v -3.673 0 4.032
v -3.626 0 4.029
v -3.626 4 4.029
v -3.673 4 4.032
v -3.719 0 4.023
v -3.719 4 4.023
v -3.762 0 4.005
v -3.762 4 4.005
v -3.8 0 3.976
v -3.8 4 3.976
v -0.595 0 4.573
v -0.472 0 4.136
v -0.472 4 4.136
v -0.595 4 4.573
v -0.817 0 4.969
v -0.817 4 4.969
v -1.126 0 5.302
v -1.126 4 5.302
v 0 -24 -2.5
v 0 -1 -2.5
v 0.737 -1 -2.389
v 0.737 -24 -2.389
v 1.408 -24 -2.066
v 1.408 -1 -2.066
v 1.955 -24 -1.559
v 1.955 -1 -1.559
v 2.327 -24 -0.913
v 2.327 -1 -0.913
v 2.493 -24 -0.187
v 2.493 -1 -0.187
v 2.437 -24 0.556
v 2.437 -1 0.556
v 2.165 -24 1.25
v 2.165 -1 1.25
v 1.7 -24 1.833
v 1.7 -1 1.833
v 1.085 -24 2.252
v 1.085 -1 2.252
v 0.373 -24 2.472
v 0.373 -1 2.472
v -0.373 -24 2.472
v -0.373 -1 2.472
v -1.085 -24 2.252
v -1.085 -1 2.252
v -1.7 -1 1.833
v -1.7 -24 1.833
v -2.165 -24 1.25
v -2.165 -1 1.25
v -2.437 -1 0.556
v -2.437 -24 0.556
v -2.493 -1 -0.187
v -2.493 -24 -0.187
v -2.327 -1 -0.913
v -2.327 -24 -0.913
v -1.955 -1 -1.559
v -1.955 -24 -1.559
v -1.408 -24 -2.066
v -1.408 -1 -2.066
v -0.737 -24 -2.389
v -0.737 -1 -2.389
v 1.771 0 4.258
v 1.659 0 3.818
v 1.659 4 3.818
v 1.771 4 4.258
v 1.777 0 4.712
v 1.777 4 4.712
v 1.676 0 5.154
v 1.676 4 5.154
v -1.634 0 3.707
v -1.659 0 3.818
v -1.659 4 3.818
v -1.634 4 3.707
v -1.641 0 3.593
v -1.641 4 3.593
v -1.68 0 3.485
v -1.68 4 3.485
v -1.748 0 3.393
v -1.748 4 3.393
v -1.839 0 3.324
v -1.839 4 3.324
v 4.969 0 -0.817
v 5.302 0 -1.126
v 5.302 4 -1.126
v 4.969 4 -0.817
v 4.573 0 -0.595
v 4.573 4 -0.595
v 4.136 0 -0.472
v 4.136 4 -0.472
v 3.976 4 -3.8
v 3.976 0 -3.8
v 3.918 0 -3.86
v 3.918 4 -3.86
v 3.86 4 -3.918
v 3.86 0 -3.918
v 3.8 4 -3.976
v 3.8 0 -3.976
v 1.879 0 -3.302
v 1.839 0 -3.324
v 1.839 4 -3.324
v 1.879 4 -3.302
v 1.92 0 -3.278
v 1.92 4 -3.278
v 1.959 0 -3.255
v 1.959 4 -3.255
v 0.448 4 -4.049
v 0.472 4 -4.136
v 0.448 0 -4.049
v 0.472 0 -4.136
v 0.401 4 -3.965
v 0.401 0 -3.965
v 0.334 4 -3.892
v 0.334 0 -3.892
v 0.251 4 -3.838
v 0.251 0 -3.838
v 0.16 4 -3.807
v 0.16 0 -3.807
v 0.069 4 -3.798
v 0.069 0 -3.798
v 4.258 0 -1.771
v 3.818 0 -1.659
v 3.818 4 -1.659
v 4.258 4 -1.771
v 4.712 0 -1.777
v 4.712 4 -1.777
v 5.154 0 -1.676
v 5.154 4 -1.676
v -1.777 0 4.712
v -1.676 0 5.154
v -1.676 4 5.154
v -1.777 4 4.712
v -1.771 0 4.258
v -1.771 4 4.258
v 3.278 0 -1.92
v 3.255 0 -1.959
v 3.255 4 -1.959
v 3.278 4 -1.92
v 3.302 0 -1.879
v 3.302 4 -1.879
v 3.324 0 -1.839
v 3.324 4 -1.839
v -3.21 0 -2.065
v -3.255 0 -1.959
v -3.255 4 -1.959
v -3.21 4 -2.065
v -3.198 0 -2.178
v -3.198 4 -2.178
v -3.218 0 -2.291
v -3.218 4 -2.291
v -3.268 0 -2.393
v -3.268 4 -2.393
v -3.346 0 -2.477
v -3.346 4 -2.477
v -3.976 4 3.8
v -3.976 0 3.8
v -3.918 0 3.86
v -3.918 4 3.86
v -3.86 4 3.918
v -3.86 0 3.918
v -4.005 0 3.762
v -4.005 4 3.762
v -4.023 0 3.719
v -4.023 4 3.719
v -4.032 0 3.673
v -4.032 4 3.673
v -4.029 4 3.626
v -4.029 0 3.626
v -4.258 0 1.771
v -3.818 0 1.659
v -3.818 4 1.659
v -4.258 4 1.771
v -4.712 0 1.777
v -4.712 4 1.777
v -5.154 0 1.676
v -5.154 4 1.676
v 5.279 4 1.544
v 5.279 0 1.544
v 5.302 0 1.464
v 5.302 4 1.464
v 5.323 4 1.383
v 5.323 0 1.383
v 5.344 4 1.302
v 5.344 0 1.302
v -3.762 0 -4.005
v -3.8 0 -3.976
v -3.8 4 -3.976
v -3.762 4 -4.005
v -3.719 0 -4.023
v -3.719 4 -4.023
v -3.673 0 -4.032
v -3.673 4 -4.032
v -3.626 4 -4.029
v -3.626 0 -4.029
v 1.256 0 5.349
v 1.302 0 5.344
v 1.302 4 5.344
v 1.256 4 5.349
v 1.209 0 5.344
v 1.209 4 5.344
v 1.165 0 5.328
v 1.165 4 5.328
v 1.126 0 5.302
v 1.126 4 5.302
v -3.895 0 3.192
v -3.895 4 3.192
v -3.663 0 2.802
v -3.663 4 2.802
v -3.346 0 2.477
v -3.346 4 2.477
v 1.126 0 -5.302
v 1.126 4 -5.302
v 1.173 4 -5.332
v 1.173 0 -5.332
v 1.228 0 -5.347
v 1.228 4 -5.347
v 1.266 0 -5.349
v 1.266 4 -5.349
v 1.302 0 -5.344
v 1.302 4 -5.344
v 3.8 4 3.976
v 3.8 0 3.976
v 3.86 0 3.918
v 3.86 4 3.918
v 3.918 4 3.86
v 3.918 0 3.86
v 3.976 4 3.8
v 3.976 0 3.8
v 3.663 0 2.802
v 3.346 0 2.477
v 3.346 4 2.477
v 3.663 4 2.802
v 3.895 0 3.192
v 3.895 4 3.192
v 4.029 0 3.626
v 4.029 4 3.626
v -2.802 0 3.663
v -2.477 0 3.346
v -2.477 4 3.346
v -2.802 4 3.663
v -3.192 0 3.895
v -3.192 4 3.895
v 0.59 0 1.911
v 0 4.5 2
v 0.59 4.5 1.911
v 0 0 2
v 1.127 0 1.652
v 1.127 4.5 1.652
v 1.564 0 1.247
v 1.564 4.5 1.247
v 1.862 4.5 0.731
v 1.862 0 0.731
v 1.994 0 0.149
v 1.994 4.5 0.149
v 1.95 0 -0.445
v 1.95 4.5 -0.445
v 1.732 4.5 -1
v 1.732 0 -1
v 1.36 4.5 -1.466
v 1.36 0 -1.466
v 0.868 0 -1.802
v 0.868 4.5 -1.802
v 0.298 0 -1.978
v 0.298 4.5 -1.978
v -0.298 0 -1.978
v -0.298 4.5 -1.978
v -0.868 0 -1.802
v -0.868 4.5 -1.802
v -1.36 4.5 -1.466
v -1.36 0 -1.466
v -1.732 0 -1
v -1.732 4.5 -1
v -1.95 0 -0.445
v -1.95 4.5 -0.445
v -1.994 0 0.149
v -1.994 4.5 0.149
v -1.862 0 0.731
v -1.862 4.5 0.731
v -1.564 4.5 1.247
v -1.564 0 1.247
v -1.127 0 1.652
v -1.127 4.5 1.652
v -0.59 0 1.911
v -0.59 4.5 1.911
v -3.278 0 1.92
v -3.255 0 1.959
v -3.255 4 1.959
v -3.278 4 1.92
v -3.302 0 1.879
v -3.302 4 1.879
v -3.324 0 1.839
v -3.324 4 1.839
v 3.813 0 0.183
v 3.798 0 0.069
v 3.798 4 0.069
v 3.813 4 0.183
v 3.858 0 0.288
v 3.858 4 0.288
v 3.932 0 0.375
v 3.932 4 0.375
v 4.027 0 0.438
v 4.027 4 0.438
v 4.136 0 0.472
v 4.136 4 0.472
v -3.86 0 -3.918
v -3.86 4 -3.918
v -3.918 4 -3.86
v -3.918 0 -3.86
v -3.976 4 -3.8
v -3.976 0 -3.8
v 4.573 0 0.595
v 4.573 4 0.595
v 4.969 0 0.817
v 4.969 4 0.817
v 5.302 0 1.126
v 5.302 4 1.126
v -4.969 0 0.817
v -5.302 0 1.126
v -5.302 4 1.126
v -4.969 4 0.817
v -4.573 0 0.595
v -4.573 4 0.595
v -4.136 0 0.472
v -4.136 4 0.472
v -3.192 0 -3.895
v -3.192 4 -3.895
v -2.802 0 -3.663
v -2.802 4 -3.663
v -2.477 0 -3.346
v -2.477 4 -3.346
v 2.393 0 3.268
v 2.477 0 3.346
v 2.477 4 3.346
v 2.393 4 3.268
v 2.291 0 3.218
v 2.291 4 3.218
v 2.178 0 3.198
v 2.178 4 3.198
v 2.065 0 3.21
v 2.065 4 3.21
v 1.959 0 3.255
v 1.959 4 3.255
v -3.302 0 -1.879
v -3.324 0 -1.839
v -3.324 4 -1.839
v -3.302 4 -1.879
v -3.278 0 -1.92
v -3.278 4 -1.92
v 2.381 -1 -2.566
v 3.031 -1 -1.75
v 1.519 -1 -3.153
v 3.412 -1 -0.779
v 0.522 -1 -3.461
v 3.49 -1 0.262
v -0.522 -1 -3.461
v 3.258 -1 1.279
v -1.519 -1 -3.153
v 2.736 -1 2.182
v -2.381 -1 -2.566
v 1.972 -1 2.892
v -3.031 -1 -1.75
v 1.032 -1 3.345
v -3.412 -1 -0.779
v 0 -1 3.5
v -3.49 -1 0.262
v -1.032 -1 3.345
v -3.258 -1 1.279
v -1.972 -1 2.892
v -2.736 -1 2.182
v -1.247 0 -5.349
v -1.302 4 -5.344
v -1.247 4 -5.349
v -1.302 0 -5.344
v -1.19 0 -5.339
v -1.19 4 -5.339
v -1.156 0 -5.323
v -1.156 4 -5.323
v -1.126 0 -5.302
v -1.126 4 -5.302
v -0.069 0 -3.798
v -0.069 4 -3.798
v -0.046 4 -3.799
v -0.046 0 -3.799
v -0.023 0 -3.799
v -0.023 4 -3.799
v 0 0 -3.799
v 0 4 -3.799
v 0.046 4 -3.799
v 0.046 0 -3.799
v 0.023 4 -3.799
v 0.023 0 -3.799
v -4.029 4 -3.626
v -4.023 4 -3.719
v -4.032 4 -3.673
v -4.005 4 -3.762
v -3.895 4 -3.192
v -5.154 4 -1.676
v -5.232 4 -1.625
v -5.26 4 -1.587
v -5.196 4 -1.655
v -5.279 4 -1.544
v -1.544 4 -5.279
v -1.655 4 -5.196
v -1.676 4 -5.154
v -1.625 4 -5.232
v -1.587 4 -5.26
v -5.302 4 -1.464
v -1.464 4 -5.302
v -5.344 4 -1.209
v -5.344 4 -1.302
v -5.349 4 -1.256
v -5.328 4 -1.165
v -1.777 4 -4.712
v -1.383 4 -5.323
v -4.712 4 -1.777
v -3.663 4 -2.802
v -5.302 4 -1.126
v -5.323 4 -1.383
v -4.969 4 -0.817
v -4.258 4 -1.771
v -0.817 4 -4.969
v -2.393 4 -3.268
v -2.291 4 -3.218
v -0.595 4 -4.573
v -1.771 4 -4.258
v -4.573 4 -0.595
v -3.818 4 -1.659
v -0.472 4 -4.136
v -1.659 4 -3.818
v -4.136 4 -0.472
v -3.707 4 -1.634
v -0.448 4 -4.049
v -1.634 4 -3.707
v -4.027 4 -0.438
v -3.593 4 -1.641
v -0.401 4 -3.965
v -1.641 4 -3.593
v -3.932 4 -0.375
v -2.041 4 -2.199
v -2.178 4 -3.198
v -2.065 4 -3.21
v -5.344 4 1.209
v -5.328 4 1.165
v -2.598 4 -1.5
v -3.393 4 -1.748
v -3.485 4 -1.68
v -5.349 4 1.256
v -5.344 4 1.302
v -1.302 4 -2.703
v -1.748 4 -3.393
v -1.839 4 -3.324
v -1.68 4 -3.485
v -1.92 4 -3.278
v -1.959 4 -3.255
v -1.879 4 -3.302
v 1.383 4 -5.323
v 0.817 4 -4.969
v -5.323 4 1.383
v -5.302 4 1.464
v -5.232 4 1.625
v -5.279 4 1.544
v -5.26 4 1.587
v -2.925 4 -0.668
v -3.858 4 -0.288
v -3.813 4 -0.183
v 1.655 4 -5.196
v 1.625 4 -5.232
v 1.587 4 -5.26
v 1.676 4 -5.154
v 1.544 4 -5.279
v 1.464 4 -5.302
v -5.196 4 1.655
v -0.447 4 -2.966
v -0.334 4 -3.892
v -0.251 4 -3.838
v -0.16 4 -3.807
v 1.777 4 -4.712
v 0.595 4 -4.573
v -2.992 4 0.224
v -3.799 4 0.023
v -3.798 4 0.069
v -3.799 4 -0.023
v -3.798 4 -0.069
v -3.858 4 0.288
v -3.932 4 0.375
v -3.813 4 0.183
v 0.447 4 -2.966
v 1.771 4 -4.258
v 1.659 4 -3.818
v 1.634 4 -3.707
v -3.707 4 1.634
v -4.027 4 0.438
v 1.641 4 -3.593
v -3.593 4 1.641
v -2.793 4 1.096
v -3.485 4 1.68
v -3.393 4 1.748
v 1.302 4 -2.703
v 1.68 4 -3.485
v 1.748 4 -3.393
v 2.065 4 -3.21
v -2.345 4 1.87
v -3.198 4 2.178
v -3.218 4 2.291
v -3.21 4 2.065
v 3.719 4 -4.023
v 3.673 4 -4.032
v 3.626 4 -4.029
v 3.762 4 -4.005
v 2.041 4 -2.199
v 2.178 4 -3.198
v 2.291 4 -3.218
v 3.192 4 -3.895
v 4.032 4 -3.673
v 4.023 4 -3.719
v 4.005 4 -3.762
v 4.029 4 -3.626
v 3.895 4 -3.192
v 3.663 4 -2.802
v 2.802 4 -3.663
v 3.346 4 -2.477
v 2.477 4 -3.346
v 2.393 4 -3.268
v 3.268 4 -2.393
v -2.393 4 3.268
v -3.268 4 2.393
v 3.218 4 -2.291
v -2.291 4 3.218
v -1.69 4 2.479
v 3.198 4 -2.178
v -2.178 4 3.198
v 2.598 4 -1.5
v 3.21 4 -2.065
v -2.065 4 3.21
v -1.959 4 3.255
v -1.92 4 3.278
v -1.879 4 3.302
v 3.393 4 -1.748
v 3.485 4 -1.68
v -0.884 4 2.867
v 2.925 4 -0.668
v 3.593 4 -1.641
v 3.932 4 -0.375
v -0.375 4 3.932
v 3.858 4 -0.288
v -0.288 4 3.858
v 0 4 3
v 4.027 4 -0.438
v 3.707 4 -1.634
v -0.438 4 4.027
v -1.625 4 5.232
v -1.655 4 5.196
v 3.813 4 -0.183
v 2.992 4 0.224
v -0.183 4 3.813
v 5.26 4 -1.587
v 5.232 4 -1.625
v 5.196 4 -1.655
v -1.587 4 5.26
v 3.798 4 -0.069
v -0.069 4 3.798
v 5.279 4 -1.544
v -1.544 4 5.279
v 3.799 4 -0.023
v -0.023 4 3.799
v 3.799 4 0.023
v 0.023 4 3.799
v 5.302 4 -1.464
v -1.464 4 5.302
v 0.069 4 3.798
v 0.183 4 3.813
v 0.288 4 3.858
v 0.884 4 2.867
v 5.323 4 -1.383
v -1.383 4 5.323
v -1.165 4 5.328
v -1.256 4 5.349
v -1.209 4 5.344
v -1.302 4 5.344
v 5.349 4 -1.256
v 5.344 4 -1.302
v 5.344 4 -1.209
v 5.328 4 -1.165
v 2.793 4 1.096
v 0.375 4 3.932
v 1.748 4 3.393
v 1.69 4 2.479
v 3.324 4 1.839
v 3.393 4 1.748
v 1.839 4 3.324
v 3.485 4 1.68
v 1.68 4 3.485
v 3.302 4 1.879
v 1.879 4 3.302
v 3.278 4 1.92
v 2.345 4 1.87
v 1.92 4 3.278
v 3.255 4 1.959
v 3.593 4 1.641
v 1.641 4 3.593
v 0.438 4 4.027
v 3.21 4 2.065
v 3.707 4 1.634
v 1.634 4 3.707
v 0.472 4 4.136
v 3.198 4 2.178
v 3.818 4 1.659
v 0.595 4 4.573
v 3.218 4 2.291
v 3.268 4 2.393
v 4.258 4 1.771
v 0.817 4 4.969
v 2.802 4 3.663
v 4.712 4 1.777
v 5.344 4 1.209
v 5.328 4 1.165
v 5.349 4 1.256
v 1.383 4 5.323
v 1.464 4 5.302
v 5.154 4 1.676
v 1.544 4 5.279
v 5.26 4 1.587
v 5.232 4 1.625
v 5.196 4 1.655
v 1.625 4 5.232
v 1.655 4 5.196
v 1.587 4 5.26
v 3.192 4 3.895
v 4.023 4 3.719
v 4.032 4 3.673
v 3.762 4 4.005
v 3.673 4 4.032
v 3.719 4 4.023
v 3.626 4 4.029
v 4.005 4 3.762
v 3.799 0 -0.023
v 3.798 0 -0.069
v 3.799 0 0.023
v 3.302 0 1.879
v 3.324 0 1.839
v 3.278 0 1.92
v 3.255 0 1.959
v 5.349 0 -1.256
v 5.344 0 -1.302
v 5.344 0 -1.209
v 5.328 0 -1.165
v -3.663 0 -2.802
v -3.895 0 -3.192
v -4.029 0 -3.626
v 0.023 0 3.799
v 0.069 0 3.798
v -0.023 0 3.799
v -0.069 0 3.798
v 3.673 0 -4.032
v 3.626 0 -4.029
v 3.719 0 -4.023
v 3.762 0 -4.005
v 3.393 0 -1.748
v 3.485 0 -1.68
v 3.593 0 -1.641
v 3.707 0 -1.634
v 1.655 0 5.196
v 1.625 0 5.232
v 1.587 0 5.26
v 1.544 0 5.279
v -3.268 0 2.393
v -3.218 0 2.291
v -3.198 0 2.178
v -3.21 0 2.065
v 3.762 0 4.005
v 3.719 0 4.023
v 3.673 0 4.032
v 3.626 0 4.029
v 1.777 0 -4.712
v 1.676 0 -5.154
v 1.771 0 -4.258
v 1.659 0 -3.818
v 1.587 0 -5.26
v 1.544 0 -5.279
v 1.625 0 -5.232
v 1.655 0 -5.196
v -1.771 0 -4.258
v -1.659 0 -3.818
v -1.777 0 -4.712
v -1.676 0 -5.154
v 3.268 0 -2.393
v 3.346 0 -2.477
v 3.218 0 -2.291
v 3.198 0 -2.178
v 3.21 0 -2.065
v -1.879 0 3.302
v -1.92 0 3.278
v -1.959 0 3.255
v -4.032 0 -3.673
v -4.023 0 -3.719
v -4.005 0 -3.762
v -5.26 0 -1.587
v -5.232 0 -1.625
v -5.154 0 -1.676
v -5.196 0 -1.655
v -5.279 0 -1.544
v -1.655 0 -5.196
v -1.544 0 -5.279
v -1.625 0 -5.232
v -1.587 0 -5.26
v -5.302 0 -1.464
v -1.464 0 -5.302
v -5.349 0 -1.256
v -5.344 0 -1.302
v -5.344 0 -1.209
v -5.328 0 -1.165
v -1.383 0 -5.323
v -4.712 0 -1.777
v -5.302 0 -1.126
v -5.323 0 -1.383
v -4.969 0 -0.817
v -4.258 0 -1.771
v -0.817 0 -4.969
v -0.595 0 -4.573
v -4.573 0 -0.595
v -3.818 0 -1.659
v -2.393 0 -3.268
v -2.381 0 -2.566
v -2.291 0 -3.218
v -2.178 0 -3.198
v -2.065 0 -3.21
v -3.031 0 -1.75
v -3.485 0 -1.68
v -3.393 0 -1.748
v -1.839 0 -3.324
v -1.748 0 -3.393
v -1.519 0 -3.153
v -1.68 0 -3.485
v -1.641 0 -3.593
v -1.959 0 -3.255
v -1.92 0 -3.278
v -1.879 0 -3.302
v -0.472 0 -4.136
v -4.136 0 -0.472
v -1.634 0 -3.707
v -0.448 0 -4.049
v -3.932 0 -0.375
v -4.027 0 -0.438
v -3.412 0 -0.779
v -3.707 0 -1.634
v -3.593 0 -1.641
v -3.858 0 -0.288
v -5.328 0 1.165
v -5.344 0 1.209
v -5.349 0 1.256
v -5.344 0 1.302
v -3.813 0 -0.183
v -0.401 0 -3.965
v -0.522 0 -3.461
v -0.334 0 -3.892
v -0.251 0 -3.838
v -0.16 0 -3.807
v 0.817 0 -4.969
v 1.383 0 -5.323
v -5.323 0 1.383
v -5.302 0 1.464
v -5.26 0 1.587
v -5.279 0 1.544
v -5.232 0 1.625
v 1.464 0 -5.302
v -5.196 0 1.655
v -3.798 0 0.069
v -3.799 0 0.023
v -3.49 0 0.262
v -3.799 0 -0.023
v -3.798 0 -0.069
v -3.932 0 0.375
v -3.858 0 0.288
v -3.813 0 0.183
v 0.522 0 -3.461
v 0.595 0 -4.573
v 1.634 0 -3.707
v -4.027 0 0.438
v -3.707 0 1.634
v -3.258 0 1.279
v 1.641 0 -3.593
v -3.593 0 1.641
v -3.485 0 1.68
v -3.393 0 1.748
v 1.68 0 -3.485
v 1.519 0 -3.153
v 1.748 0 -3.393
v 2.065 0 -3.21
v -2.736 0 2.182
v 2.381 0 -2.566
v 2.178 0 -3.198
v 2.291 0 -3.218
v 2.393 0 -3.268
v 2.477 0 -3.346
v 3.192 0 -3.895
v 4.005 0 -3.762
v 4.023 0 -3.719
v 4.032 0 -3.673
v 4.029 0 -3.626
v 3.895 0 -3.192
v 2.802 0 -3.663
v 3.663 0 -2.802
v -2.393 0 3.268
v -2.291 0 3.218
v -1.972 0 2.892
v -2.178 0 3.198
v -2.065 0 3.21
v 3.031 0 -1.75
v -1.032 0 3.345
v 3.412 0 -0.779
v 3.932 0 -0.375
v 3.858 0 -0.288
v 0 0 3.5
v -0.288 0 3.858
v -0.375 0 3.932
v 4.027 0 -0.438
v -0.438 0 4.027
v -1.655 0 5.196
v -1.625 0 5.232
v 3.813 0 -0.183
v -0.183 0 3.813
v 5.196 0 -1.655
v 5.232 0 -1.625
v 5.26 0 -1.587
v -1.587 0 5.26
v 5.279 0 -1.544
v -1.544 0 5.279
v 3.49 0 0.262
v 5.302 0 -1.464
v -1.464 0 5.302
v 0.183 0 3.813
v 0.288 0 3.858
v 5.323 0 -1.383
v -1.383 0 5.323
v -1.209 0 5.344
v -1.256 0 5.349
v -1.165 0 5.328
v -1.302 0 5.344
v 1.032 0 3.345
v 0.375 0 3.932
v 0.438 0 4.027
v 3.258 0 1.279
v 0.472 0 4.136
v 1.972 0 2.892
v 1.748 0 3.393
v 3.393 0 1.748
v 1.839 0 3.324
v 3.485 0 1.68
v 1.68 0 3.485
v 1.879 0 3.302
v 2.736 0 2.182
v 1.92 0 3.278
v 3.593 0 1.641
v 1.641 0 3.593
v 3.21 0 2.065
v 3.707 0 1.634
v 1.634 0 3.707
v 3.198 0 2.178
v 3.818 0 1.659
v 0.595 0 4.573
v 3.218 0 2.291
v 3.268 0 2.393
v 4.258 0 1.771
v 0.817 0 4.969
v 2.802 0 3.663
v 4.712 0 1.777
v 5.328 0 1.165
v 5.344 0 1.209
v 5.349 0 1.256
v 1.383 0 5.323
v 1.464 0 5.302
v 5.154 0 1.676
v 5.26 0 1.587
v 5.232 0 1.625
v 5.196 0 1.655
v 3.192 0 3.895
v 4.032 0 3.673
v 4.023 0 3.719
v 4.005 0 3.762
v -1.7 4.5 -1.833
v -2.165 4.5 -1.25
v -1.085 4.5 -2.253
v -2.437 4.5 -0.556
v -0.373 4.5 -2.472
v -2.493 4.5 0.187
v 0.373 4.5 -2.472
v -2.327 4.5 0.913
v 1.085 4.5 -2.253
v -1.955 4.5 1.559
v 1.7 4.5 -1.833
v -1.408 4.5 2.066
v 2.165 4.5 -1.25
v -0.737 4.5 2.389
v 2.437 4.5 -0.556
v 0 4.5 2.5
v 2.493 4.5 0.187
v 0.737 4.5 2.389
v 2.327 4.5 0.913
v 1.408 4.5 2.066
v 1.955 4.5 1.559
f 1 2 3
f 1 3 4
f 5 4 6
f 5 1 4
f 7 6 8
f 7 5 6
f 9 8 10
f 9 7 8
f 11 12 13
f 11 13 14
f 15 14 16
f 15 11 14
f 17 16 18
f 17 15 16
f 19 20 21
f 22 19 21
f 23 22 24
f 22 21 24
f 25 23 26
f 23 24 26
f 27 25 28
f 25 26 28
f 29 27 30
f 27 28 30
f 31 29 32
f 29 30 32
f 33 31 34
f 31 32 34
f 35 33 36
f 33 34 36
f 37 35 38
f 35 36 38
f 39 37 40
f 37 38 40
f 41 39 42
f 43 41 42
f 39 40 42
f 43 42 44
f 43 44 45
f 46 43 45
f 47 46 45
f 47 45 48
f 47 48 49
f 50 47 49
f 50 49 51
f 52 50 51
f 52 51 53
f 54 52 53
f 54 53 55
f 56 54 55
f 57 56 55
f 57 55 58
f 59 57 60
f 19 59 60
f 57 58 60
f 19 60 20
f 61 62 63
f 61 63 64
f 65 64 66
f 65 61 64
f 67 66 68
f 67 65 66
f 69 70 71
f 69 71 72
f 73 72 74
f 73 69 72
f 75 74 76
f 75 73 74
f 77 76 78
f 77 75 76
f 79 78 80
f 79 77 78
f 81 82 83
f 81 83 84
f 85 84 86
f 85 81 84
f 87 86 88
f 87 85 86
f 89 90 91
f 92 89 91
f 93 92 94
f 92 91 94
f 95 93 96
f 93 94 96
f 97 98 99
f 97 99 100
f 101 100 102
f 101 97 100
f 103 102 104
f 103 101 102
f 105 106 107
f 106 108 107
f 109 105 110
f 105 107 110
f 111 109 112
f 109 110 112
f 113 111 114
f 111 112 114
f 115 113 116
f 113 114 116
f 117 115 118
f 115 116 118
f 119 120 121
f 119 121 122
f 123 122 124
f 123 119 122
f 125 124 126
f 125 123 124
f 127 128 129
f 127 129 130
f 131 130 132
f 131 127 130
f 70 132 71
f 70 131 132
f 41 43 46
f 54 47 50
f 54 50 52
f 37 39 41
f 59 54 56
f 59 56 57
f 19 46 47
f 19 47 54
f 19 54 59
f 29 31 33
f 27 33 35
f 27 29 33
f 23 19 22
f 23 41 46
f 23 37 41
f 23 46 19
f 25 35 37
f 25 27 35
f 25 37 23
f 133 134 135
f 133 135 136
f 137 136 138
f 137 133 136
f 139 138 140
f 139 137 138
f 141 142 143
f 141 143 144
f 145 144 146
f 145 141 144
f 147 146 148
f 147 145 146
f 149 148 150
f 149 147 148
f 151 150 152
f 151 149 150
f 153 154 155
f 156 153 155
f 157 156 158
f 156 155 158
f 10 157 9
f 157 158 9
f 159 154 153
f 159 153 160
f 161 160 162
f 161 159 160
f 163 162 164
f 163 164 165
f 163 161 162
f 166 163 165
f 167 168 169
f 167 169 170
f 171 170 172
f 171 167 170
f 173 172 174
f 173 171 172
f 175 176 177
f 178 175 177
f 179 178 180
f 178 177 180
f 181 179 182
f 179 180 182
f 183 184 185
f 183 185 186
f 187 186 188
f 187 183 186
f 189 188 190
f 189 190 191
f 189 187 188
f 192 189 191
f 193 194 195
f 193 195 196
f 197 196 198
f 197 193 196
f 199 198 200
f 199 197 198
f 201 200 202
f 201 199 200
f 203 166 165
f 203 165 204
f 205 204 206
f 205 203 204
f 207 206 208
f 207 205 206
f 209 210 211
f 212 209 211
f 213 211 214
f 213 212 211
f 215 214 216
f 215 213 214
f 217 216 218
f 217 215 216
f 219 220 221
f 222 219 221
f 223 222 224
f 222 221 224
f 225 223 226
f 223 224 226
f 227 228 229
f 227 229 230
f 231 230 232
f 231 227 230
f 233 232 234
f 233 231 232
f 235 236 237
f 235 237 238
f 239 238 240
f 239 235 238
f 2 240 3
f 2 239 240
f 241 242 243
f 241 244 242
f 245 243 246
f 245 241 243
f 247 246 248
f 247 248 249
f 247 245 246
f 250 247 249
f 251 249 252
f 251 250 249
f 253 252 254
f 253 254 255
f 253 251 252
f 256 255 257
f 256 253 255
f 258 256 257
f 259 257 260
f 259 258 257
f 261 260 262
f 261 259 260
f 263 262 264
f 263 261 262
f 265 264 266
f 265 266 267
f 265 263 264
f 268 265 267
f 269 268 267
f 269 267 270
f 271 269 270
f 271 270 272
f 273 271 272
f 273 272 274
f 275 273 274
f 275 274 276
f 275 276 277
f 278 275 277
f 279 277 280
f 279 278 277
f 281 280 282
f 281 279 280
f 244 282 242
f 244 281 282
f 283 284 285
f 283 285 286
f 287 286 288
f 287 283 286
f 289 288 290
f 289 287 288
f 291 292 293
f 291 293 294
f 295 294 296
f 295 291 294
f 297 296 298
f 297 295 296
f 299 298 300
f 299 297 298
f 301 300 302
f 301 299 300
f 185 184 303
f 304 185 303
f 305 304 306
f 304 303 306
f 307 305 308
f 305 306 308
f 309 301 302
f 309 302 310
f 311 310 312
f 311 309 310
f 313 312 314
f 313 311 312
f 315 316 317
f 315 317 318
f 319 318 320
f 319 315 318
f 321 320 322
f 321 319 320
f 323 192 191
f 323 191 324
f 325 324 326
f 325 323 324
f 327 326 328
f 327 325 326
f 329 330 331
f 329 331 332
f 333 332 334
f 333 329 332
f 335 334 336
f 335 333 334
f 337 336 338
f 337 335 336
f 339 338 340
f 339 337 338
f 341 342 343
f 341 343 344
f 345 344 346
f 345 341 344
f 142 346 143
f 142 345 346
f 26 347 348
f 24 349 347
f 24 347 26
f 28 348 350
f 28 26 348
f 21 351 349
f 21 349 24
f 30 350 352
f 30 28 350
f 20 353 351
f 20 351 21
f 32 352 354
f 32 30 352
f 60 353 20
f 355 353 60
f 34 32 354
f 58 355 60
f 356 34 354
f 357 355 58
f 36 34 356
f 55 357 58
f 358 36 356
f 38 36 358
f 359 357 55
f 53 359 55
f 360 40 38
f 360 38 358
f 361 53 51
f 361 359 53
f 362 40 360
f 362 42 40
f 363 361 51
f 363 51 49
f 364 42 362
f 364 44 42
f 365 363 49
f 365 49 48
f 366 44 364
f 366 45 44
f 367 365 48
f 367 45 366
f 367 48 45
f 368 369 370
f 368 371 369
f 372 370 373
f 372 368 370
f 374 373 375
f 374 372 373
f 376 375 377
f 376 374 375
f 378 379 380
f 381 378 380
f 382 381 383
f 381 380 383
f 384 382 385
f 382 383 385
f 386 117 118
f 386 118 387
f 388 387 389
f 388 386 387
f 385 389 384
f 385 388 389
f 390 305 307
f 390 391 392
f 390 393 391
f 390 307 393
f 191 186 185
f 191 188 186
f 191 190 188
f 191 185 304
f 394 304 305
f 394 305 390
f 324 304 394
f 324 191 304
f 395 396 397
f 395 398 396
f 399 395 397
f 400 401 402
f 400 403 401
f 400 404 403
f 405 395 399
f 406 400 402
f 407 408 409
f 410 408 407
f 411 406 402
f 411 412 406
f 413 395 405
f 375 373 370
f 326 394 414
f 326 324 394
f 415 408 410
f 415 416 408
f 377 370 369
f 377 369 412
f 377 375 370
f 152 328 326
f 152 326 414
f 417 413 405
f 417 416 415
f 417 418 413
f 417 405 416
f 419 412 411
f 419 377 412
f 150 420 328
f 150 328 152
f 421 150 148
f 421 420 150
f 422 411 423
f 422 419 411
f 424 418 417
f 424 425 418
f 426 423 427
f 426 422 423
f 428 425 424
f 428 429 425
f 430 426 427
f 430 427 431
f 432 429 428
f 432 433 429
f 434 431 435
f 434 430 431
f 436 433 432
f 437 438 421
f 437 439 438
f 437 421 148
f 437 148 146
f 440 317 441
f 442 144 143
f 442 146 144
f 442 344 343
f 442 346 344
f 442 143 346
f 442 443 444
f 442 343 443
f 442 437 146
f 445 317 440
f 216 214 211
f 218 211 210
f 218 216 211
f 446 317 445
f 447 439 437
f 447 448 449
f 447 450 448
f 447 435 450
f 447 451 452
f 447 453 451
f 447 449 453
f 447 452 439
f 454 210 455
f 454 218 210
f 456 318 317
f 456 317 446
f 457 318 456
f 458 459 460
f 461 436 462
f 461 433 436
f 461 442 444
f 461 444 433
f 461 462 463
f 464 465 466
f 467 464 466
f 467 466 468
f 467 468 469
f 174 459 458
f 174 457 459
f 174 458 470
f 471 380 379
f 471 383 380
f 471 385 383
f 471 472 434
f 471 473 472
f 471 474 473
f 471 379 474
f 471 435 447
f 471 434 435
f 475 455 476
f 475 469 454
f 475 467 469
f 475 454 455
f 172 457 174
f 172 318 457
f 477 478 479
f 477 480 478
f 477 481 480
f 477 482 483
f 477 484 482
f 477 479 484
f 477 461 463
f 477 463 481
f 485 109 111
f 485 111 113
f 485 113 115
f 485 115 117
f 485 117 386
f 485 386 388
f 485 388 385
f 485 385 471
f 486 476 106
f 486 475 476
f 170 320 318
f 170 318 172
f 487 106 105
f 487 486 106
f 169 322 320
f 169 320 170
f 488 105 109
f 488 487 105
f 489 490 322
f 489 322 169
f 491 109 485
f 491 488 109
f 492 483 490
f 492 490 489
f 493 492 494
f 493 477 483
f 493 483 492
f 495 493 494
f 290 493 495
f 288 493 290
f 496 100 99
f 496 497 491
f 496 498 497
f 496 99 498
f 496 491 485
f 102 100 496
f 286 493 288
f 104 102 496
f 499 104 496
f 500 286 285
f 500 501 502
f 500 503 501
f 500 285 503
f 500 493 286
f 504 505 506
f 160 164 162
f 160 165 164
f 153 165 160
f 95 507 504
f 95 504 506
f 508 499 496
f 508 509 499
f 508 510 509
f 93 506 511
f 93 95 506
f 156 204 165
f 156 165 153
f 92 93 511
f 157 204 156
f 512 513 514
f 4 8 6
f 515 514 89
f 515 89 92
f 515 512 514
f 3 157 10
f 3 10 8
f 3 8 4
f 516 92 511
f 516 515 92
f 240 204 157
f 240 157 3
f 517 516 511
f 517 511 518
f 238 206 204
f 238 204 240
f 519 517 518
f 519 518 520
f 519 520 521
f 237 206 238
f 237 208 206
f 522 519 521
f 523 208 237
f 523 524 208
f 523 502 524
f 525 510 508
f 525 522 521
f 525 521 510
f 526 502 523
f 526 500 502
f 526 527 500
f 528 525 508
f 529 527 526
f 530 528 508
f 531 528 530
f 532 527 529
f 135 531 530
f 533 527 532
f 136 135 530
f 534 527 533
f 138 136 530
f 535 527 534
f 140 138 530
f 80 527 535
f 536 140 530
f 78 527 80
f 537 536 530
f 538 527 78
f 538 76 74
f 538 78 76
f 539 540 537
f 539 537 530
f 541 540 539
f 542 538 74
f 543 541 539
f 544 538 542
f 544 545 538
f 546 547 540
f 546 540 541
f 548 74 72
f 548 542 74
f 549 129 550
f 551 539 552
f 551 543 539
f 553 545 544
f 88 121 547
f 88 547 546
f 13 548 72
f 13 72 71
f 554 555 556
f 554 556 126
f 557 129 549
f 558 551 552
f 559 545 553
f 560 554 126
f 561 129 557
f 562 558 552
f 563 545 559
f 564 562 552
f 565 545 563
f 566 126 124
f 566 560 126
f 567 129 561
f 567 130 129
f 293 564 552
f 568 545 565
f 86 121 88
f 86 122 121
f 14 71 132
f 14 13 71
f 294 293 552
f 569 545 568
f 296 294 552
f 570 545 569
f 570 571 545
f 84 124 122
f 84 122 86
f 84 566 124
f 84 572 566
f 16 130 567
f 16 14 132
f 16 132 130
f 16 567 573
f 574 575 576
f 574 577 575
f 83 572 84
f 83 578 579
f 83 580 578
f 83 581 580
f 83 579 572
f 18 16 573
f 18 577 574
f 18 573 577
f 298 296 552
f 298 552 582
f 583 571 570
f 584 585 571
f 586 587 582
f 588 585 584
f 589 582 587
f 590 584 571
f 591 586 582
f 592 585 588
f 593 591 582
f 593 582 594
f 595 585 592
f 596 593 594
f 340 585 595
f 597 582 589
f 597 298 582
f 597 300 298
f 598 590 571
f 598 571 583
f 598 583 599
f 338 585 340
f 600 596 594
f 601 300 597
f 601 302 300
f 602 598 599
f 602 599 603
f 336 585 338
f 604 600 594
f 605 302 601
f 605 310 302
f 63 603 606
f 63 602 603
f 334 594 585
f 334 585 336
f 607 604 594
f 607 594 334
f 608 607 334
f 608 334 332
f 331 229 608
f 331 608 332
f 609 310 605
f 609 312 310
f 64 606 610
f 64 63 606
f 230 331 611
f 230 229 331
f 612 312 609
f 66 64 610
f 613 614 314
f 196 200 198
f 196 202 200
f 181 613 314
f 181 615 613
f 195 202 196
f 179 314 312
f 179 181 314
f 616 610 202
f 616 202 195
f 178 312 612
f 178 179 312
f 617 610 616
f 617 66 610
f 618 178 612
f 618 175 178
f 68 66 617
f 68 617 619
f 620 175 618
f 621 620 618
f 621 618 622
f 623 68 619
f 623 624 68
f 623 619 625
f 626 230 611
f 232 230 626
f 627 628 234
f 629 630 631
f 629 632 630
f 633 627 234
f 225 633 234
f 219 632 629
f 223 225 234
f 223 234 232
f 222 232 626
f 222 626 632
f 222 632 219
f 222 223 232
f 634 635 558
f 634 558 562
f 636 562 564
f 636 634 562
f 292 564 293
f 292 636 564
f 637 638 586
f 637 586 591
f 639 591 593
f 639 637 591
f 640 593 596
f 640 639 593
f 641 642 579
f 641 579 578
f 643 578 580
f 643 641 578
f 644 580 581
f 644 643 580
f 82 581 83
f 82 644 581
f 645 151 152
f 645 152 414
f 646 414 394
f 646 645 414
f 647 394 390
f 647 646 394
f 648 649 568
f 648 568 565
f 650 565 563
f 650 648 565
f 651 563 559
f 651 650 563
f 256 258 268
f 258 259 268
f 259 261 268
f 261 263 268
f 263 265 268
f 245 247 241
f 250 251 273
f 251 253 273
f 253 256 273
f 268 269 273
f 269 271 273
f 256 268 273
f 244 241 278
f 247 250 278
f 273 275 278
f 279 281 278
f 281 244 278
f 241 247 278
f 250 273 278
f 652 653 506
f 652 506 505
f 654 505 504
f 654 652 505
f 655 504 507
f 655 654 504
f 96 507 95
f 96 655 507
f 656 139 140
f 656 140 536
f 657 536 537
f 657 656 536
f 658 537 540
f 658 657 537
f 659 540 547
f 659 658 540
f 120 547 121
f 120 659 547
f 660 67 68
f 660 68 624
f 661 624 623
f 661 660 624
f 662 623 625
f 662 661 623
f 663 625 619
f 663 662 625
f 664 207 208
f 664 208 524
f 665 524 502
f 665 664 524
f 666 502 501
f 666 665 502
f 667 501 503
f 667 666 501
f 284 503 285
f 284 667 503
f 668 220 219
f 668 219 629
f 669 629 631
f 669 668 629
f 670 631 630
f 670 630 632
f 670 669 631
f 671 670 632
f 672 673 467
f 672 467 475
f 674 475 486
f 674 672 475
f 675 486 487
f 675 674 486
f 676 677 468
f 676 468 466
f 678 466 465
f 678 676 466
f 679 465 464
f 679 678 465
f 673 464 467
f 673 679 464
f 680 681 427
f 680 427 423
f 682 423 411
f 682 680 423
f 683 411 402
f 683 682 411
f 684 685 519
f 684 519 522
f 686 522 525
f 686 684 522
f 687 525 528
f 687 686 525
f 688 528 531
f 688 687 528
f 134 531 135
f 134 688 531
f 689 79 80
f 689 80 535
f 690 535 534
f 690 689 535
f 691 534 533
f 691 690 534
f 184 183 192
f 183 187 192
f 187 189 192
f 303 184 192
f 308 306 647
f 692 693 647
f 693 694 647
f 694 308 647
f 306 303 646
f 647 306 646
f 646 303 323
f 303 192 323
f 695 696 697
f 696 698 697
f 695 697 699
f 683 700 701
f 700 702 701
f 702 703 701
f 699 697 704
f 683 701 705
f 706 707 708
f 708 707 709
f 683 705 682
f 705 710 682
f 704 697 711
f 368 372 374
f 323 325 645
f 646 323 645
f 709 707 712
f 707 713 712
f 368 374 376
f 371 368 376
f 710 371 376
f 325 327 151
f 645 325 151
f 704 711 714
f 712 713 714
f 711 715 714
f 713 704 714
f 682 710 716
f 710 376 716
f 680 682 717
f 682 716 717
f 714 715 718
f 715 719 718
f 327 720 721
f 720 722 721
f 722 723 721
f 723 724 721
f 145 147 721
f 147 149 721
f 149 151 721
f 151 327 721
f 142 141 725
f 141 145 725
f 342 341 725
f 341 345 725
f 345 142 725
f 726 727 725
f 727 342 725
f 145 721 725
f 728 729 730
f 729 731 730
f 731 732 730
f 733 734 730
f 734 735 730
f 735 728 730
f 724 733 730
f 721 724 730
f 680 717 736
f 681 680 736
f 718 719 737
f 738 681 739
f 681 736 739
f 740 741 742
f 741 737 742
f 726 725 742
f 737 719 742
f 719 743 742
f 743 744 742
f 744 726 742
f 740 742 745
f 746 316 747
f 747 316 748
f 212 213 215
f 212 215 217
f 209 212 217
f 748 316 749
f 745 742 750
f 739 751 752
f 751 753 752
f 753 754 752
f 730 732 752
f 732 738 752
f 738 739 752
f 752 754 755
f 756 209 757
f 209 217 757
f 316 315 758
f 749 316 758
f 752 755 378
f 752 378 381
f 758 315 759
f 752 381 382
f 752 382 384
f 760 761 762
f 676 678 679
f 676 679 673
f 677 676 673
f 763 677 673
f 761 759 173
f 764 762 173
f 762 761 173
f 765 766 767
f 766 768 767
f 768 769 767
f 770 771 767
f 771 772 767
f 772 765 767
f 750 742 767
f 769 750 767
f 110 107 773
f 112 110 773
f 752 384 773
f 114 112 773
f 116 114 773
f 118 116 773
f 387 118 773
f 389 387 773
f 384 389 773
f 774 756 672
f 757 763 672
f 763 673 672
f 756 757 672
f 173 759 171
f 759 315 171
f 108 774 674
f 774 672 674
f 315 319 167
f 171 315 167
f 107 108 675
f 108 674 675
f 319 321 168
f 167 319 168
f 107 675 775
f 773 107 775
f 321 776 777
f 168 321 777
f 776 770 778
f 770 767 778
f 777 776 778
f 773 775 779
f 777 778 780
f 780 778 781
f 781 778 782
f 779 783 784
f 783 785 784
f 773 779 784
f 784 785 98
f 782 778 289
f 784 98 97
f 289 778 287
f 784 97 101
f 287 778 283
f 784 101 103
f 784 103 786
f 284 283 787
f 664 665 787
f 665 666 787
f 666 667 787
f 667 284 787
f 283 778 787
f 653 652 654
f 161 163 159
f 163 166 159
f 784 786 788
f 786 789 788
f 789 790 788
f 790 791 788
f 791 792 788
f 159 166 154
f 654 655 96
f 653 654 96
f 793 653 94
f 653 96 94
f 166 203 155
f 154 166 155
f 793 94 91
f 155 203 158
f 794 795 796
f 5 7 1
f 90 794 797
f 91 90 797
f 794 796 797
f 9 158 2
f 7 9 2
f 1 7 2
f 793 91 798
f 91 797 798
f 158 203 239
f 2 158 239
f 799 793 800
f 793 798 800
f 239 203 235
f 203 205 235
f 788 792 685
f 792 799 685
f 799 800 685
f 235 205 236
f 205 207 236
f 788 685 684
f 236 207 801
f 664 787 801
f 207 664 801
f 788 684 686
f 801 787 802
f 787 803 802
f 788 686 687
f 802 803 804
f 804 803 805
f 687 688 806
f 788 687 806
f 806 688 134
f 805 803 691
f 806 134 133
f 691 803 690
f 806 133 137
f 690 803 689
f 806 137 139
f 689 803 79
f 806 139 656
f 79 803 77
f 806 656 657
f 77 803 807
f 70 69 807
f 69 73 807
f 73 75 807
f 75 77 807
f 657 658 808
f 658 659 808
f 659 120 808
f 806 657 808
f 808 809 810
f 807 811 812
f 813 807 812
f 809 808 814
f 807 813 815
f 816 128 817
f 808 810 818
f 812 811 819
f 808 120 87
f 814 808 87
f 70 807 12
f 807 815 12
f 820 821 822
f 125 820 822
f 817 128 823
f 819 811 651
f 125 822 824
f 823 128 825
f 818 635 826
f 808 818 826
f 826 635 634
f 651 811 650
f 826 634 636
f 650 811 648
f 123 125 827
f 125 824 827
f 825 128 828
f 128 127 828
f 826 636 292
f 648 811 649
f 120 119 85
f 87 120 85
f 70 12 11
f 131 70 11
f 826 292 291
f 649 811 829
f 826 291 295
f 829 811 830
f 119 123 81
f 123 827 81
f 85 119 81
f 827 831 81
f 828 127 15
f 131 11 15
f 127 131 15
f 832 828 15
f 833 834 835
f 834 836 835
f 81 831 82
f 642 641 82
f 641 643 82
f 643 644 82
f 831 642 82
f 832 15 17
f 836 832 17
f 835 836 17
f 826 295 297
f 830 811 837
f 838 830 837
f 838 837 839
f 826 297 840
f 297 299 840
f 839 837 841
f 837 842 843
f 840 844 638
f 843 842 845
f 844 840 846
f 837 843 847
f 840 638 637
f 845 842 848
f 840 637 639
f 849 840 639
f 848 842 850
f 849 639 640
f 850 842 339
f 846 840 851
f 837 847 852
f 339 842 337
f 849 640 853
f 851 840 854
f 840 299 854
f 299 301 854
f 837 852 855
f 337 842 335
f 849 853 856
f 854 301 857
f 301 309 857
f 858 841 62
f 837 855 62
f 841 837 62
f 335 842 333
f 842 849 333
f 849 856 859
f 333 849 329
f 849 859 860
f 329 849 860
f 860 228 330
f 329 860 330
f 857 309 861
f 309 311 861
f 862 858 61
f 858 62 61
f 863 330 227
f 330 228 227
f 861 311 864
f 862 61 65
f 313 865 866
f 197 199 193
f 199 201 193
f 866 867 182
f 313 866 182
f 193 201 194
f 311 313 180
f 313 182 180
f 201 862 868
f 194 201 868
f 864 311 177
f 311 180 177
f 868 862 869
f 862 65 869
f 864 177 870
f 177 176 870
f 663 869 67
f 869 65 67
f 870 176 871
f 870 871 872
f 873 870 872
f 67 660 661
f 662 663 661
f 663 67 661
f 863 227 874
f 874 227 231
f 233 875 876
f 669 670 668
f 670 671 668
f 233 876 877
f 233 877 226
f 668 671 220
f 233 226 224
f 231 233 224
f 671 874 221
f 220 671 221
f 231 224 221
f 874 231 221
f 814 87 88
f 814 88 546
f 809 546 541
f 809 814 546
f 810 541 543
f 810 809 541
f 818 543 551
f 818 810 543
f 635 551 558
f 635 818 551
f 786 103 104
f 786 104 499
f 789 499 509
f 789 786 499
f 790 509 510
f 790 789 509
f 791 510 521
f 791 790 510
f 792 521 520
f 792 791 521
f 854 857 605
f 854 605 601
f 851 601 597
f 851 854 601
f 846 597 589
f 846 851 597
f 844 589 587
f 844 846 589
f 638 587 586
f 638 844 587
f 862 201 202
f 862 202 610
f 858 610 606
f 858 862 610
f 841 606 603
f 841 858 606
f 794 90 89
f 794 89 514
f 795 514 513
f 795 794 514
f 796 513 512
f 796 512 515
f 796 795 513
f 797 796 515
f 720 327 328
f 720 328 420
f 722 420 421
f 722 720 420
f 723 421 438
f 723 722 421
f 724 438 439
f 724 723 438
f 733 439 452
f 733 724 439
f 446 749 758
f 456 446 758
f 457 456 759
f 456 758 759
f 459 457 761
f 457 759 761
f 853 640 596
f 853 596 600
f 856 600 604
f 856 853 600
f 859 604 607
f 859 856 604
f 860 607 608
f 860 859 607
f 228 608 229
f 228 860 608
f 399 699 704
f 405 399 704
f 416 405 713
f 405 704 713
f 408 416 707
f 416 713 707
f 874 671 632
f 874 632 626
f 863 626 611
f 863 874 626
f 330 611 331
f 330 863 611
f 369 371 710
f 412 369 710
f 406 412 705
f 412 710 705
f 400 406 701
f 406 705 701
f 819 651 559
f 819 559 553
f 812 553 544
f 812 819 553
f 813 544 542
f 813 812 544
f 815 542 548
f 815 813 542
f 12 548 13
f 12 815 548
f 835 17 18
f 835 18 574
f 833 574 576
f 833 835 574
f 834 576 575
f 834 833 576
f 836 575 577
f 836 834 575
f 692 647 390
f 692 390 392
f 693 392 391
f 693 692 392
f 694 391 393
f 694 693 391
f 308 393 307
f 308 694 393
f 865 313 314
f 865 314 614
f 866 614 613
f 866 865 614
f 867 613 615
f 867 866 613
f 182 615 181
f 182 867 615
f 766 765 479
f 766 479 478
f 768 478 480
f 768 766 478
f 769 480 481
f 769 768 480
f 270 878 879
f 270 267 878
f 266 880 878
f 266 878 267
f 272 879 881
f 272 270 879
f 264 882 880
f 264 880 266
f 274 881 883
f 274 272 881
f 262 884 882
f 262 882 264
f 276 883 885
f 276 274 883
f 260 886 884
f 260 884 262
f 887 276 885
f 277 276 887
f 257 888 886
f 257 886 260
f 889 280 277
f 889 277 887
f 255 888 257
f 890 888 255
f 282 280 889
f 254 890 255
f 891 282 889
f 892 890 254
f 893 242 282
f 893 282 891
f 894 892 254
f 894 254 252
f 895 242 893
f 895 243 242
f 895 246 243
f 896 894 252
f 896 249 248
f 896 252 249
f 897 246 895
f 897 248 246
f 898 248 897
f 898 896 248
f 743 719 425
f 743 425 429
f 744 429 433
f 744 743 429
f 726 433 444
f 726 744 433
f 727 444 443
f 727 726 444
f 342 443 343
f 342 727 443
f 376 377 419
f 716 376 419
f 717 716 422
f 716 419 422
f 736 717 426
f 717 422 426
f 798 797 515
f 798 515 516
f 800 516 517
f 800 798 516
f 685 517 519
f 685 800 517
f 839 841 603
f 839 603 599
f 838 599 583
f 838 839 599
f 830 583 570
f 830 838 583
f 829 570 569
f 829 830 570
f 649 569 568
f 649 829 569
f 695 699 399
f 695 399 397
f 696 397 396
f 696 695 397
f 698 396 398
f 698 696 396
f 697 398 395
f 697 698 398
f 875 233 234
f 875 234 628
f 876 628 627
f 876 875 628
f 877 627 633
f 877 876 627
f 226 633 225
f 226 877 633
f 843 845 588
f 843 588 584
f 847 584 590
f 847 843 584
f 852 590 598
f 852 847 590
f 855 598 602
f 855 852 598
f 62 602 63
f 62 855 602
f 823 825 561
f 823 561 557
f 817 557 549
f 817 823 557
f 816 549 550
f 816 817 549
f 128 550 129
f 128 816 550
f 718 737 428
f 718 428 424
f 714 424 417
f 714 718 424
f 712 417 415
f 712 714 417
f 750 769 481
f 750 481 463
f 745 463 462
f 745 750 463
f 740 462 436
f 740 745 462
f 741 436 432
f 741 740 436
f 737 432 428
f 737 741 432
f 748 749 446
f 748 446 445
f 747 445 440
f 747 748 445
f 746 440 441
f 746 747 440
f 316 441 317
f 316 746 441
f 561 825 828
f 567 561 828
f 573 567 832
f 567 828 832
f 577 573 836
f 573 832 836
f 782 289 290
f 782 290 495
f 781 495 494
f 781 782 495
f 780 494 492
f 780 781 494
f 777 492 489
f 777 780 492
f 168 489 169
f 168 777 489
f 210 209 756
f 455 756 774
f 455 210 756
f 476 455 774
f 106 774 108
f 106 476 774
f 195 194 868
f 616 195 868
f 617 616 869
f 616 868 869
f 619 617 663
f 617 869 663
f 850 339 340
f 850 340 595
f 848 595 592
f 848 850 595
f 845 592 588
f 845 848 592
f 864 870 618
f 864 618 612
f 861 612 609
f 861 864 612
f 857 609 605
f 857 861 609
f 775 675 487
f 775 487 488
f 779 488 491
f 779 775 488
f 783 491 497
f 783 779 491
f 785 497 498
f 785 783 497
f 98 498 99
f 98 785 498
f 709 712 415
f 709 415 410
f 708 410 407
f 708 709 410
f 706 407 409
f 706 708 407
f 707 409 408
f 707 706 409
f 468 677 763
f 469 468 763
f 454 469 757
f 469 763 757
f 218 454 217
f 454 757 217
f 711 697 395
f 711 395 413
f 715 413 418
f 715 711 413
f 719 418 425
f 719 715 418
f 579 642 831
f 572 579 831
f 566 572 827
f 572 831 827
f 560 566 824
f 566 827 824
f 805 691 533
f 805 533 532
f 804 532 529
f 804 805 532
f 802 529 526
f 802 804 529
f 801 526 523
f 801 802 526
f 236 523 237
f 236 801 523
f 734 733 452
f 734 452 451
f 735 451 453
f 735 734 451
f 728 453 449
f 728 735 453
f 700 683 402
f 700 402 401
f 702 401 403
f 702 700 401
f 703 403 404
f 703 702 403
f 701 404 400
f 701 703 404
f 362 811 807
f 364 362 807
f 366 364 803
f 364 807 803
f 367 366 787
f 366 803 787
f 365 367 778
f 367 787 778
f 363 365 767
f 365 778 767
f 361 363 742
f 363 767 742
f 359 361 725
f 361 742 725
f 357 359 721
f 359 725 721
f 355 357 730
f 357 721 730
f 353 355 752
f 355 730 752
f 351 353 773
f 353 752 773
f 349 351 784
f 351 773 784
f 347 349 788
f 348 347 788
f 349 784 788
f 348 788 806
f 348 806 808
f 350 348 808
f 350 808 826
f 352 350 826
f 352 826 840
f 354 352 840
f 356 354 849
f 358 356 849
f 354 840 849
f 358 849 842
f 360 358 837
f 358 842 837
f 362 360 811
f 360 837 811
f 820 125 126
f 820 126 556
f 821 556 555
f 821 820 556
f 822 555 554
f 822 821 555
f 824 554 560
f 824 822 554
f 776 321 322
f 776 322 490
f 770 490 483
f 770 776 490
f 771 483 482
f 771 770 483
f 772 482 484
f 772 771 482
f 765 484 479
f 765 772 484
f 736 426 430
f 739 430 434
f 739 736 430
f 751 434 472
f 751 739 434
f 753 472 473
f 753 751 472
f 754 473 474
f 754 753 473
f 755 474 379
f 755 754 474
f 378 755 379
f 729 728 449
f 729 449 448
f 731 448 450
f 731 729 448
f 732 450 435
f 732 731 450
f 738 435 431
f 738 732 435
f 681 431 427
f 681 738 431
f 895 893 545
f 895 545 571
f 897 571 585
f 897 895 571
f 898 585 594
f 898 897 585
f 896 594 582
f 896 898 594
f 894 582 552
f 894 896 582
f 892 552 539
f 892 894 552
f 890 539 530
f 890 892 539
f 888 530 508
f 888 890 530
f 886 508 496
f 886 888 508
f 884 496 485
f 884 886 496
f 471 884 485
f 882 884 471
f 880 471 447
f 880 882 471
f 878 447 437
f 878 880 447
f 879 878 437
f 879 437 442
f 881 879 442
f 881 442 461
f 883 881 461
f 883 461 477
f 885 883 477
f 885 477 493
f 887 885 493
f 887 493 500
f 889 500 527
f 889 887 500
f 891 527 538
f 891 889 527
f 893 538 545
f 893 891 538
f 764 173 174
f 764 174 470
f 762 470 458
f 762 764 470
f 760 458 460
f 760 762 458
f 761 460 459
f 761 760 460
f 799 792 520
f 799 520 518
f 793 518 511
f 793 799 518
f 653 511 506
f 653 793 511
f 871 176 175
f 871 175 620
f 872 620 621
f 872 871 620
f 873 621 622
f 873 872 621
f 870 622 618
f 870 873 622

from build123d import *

# Parameters (mm, degrees)
SKETCH1_R            = 5.5
SKETCH1_R_2          = 2
BOSS_EXTRUDE1_DEPTH  = 4
CUT_EXTRUDE1_DEPTH   = 4
FILLET1_R            = 0.2
FILLET2_R            = 0.4
FILLET1_OF_MIRROR1_R = 0.2
FILLET2_OF_MIRROR1_R = 0.4
CIRPATTERN1_DEPTH    = 4
SKETCH3_R            = 3
SKETCH3_R_2          = 2
BOSS_EXTRUDE2_DEPTH  = 0.5
CHAMFER1_SIZE        = 0.5
SKETCH4_R            = 3.5
BOSS_EXTRUDE3_DEPTH  = 1
SKETCH5_R            = 2.5
BOSS_EXTRUDE4_DEPTH  = 23


# Read off the part's stored shape, not the designer's step: CirPattern1
with BuildPart() as part:
    # Sketch1 → Boss-Extrude1 (new body)
    with BuildSketch(Plane(origin=(0, 0, 0), x_dir=(1, 0, 0), z_dir=(0, 1, 0))):
        with Locations(Location((0, 0, 0), (0, 0, 270))):
            Circle(SKETCH1_R)
        with Locations(Location((0, 0, 0), (0, 0, 270))):
            Circle(SKETCH1_R_2, mode=Mode.SUBTRACT)
    extrude(amount=BOSS_EXTRUDE1_DEPTH)

    # Sketch2 → Cut-Extrude1 (cut)
    with BuildSketch(Plane(origin=(0, 4, 0), x_dir=(1, 0, 0), z_dir=(0, 1, 0))):
        with BuildLine():
            Line((0, 3.799), (0, 7.477315916))
            Line((0, 7.477315916), (-1.717756705, 5.644784223))
            ThreePointArc((-1.717756705, 5.644784223), (-0.778860554, 4.915006115), (-0.449816676, 3.772275965))
            ThreePointArc((-0.449816676, 3.772275965), (-0.225304913, 3.792313106), (0, 3.799))
        make_face()
    cut_extrude1 = extrude(amount=-CUT_EXTRUDE1_DEPTH, mode=Mode.SUBTRACT)

    # Fillet1
    fillet1_edges = [part.edges().sort_by_distance(p)[0] for p in [
        (-1.205722077, 2, -5.366212284),
    ]]
    fillet(fillet1_edges, radius=FILLET1_R)

    # Fillet2
    fillet2_edges = [part.edges().sort_by_distance(p)[0] for p in [
        (-0.449816676, 2, -3.772275965),
    ]]
    fillet(fillet2_edges, radius=FILLET2_R)

    # Mirror1: Cut-Extrude1 across plane
    add(cut_extrude1.mirror(Plane.ZY), mode=Mode.SUBTRACT)

    # Fillet1 of Mirror1
    fillet1_of_mirror1_edges = [part.edges().sort_by_distance(p)[0] for p in [
        (1.205722077, 2, -5.366212284),
    ]]
    fillet(fillet1_of_mirror1_edges, radius=FILLET1_OF_MIRROR1_R)

    # Fillet2 of Mirror1
    fillet2_of_mirror1_edges = [part.edges().sort_by_distance(p)[0] for p in [
        (0.449816676, 2, -3.772275965),
    ]]
    fillet(fillet2_of_mirror1_edges, radius=FILLET2_OF_MIRROR1_R)

    # CirPattern1 outline → CirPattern1 (cut)
    with BuildSketch(Plane(origin=(0, 0, 0), x_dir=(1, 0, 0), z_dir=(0, 1, 0))):
        with BuildLine():
            ThreePointArc((3.62556251, 4.028637884), (3.71888228, 4.023485264), (3.799671329, 3.976493152))
            ThreePointArc((3.799671329, 3.976493152), (2.75, 4.76313972), (1.543908423, 5.278858473))
            ThreePointArc((1.543908423, 5.278858473), (1.62499931, 5.23238916), (1.676121495, 5.154148179))
            ThreePointArc((1.676121495, 5.154148179), (1.787762124, 4.48460755), (1.659448371, 3.81806133))
            ThreePointArc((1.659448371, 3.81806133), (1.656771541, 3.537498856), (1.839050027, 3.32419855))
            ThreePointArc((1.839050027, 3.32419855), (1.8995, 3.290030509), (1.959315378, 3.254763317))
            ThreePointArc((1.959315378, 3.254763317), (2.235178105, 3.203555671), (2.47681392, 3.34615511))
            ThreePointArc((2.47681392, 3.34615511), (2.989903003, 3.79055119), (3.62556251, 4.028637884))
        make_face()
        with BuildLine():
            ThreePointArc((5.154148179, 1.676121495), (5.23238916, 1.62499931), (5.278858473, 1.543908423))
            ThreePointArc((5.278858473, 1.543908423), (4.763139721, 2.75), (3.976493152, 3.799671329))
            ThreePointArc((3.976493152, 3.799671329), (4.023485264, 3.71888228), (4.028637884, 3.62556251))
            ThreePointArc((4.028637884, 3.62556251), (3.79055119, 2.989903003), (3.34615511, 2.47681392))
            ThreePointArc((3.34615511, 2.47681392), (3.203555671, 2.235178105), (3.254763317, 1.959315378))
            ThreePointArc((3.254763317, 1.959315378), (3.290030509, 1.8995), (3.32419855, 1.839050027))
            ThreePointArc((3.32419855, 1.839050027), (3.537498856, 1.656771541), (3.81806133, 1.659448371))
            ThreePointArc((3.81806133, 1.659448371), (4.48460755, 1.787762124), (5.154148179, 1.676121495))
        make_face()
        with BuildLine():
            ThreePointArc((5.301684005, -1.125510295), (5.34388159, -1.208903897), (5.343579752, -1.302365321))
            ThreePointArc((5.343579752, -1.302365321), (5.5, 0), (5.343579752, 1.302365321))
            ThreePointArc((5.343579752, 1.302365321), (5.34388159, 1.208903897), (5.301684005, 1.125510295))
            ThreePointArc((5.301684005, 1.125510295), (4.777665126, 0.69405636), (4.13626229, 0.47190622))
            ThreePointArc((4.13626229, 0.47190622), (3.891949646, 0.333943185), (3.798365405, 0.069435233))
            ThreePointArc((3.798365405, 0.069435233), (3.799, 0), (3.798365405, -0.069435233))
            ThreePointArc((3.798365405, -0.069435233), (3.891949646, -0.333943185), (4.13626229, -0.47190622))
            ThreePointArc((4.13626229, -0.47190622), (4.777665126, -0.69405636), (5.301684005, -1.125510295))
        make_face()
        with BuildLine():
            ThreePointArc((4.028637884, -3.62556251), (4.023485264, -3.71888228), (3.976493152, -3.799671329))
            ThreePointArc((3.976493152, -3.799671329), (4.763139721, -2.75), (5.278858473, -1.543908423))
            ThreePointArc((5.278858473, -1.543908423), (5.23238916, -1.62499931), (5.154148179, -1.676121495))
            ThreePointArc((5.154148179, -1.676121495), (4.48460755, -1.787762124), (3.81806133, -1.659448371))
            ThreePointArc((3.81806133, -1.659448371), (3.537498856, -1.656771541), (3.32419855, -1.839050027))
            ThreePointArc((3.32419855, -1.839050027), (3.290030509, -1.8995), (3.254763317, -1.959315378))
            ThreePointArc((3.254763317, -1.959315378), (3.203555671, -2.235178105), (3.34615511, -2.47681392))
            ThreePointArc((3.34615511, -2.47681392), (3.79055119, -2.989903003), (4.028637884, -3.62556251))
        make_face()
        with BuildLine():
            ThreePointArc((1.676121495, -5.154148179), (1.62499931, -5.23238916), (1.543908423, -5.278858473))
            ThreePointArc((1.543908423, -5.278858473), (2.75, -4.763139721), (3.799671329, -3.976493152))
            ThreePointArc((3.799671329, -3.976493152), (3.71888228, -4.023485264), (3.62556251, -4.028637884))
            ThreePointArc((3.62556251, -4.028637884), (2.989903003, -3.79055119), (2.47681392, -3.34615511))
            ThreePointArc((2.47681392, -3.34615511), (2.235178105, -3.203555671), (1.959315378, -3.254763317))
            ThreePointArc((1.959315378, -3.254763317), (1.8995, -3.290030509), (1.839050027, -3.32419855))
            ThreePointArc((1.839050027, -3.32419855), (1.656771541, -3.537498856), (1.659448371, -3.81806133))
            ThreePointArc((1.659448371, -3.81806133), (1.787762124, -4.48460755), (1.676121495, -5.154148179))
        make_face()
        with BuildLine():
            ThreePointArc((-1.125510295, -5.301684005), (-1.208903897, -5.34388159), (-1.302365321, -5.343579752))
            ThreePointArc((-1.302365321, -5.343579752), (0, -5.5), (1.302365321, -5.343579752))
            ThreePointArc((1.302365321, -5.343579752), (1.208903897, -5.34388159), (1.125510295, -5.301684005))
            ThreePointArc((1.125510295, -5.301684005), (0.69405636, -4.777665126), (0.47190622, -4.13626229))
            ThreePointArc((0.47190622, -4.13626229), (0.333943185, -3.891949646), (0.069435233, -3.798365405))
            ThreePointArc((0.069435233, -3.798365405), (0, -3.799), (-0.069435233, -3.798365405))
            ThreePointArc((-0.069435233, -3.798365405), (-0.333943185, -3.891949646), (-0.47190622, -4.13626229))
            ThreePointArc((-0.47190622, -4.13626229), (-0.69405636, -4.777665126), (-1.125510295, -5.301684005))
        make_face()
        with BuildLine():
            ThreePointArc((-3.62556251, -4.028637884), (-3.71888228, -4.023485264), (-3.799671329, -3.976493152))
            ThreePointArc((-3.799671329, -3.976493152), (-2.75, -4.763139721), (-1.543908423, -5.278858473))
            ThreePointArc((-1.543908423, -5.278858473), (-1.62499931, -5.23238916), (-1.676121495, -5.154148179))
            ThreePointArc((-1.676121495, -5.154148179), (-1.787762124, -4.48460755), (-1.659448371, -3.81806133))
            ThreePointArc((-1.659448371, -3.81806133), (-1.656771541, -3.537498856), (-1.839050027, -3.32419855))
            ThreePointArc((-1.839050027, -3.32419855), (-1.8995, -3.290030509), (-1.959315378, -3.254763317))
            ThreePointArc((-1.959315378, -3.254763317), (-2.235178105, -3.203555671), (-2.47681392, -3.34615511))
            ThreePointArc((-2.47681392, -3.34615511), (-2.989903003, -3.79055119), (-3.62556251, -4.028637884))
        make_face()
        with BuildLine():
            ThreePointArc((-5.154148179, -1.676121495), (-5.23238916, -1.62499931), (-5.278858473, -1.543908423))
            ThreePointArc((-5.278858473, -1.543908423), (-4.763139721, -2.75), (-3.976493152, -3.799671329))
            ThreePointArc((-3.976493152, -3.799671329), (-4.023485264, -3.71888228), (-4.028637884, -3.62556251))
            ThreePointArc((-4.028637884, -3.62556251), (-3.79055119, -2.989903003), (-3.34615511, -2.47681392))
            ThreePointArc((-3.34615511, -2.47681392), (-3.203555671, -2.235178105), (-3.254763317, -1.959315378))
            ThreePointArc((-3.254763317, -1.959315378), (-3.290030509, -1.8995), (-3.32419855, -1.839050027))
            ThreePointArc((-3.32419855, -1.839050027), (-3.537498856, -1.656771541), (-3.81806133, -1.659448371))
            ThreePointArc((-3.81806133, -1.659448371), (-4.48460755, -1.787762124), (-5.154148179, -1.676121495))
        make_face()
        with BuildLine():
            ThreePointArc((-5.301684005, 1.125510295), (-5.34388159, 1.208903897), (-5.343579752, 1.302365321))
            ThreePointArc((-5.343579752, 1.302365321), (-5.5, 0), (-5.343579752, -1.302365321))
            ThreePointArc((-5.343579752, -1.302365321), (-5.34388159, -1.208903897), (-5.301684005, -1.125510295))
            ThreePointArc((-5.301684005, -1.125510295), (-4.777665126, -0.69405636), (-4.13626229, -0.47190622))
            ThreePointArc((-4.13626229, -0.47190622), (-3.891949646, -0.333943185), (-3.798365405, -0.069435233))
            ThreePointArc((-3.798365405, -0.069435233), (-3.799, 0), (-3.798365405, 0.069435233))
            ThreePointArc((-3.798365405, 0.069435233), (-3.891949646, 0.333943185), (-4.13626229, 0.47190622))
            ThreePointArc((-4.13626229, 0.47190622), (-4.777665126, 0.69405636), (-5.301684005, 1.125510295))
        make_face()
        with BuildLine():
            ThreePointArc((-4.028637884, 3.62556251), (-4.023485264, 3.71888228), (-3.976493152, 3.799671329))
            ThreePointArc((-3.976493152, 3.799671329), (-4.763139721, 2.75), (-5.278858473, 1.543908423))
            ThreePointArc((-5.278858473, 1.543908423), (-5.23238916, 1.62499931), (-5.154148179, 1.676121495))
            ThreePointArc((-5.154148179, 1.676121495), (-4.48460755, 1.787762124), (-3.81806133, 1.659448371))
            ThreePointArc((-3.81806133, 1.659448371), (-3.537498856, 1.656771541), (-3.32419855, 1.839050027))
            ThreePointArc((-3.32419855, 1.839050027), (-3.290030509, 1.8995), (-3.254763317, 1.959315378))
            ThreePointArc((-3.254763317, 1.959315378), (-3.203555671, 2.235178105), (-3.34615511, 2.47681392))
            ThreePointArc((-3.34615511, 2.47681392), (-3.79055119, 2.989903003), (-4.028637884, 3.62556251))
        make_face()
        with BuildLine():
            ThreePointArc((-1.959315378, 3.254763317), (-1.8995, 3.290030509), (-1.839050027, 3.32419855))
            ThreePointArc((-1.839050027, 3.32419855), (-1.656771541, 3.537498856), (-1.659448371, 3.81806133))
            ThreePointArc((-1.659448371, 3.81806133), (-1.787762124, 4.48460755), (-1.676121495, 5.154148179))
            ThreePointArc((-1.676121495, 5.154148179), (-1.62499931, 5.23238916), (-1.543908423, 5.278858473))
            ThreePointArc((-1.543908423, 5.278858473), (-2.75, 4.76313972), (-3.799671329, 3.976493152))
            ThreePointArc((-3.799671329, 3.976493152), (-3.71888228, 4.023485264), (-3.62556251, 4.028637884))
            ThreePointArc((-3.62556251, 4.028637884), (-2.989903003, 3.79055119), (-2.47681392, 3.34615511))
            ThreePointArc((-2.47681392, 3.34615511), (-2.235178105, 3.203555671), (-1.959315378, 3.254763317))
        make_face()
    extrude(amount=CIRPATTERN1_DEPTH, mode=Mode.SUBTRACT)

    # Sketch3 → Boss-Extrude2 (add)
    with BuildSketch(Plane(origin=(0, 4, 0), x_dir=(1, 0, 0), z_dir=(0, 1, 0))):
        with Locations(Location((0, 0, 0), (0, 0, 270))):
            Circle(SKETCH3_R)
        with Locations(Location((0, 0, 0), (0, 0, 270))):
            Circle(SKETCH3_R_2, mode=Mode.SUBTRACT)
    extrude(amount=BOSS_EXTRUDE2_DEPTH)

    # Chamfer1
    chamfer1_edges = [part.edges().sort_by_distance(p)[0] for p in [
        (0, 4.5, -3),
    ]]
    chamfer(chamfer1_edges, length=CHAMFER1_SIZE - 0.0001)  # a hair under: the kernel refuses the full size

    # Sketch4 → Boss-Extrude3 (add)
    with BuildSketch(Plane.XZ):
        with Locations(Location((0, 0, 0), (0, 0, 90))):
            Circle(SKETCH4_R)
    extrude(amount=BOSS_EXTRUDE3_DEPTH)

    # Sketch5 → Boss-Extrude4 (add)
    with BuildSketch(Plane.XZ.offset(1)):
        with Locations(Location((0, 0, 0), (0, 0, 270))):
            Circle(SKETCH5_R)
    extrude(amount=BOSS_EXTRUDE4_DEPTH)


solid = part.part
